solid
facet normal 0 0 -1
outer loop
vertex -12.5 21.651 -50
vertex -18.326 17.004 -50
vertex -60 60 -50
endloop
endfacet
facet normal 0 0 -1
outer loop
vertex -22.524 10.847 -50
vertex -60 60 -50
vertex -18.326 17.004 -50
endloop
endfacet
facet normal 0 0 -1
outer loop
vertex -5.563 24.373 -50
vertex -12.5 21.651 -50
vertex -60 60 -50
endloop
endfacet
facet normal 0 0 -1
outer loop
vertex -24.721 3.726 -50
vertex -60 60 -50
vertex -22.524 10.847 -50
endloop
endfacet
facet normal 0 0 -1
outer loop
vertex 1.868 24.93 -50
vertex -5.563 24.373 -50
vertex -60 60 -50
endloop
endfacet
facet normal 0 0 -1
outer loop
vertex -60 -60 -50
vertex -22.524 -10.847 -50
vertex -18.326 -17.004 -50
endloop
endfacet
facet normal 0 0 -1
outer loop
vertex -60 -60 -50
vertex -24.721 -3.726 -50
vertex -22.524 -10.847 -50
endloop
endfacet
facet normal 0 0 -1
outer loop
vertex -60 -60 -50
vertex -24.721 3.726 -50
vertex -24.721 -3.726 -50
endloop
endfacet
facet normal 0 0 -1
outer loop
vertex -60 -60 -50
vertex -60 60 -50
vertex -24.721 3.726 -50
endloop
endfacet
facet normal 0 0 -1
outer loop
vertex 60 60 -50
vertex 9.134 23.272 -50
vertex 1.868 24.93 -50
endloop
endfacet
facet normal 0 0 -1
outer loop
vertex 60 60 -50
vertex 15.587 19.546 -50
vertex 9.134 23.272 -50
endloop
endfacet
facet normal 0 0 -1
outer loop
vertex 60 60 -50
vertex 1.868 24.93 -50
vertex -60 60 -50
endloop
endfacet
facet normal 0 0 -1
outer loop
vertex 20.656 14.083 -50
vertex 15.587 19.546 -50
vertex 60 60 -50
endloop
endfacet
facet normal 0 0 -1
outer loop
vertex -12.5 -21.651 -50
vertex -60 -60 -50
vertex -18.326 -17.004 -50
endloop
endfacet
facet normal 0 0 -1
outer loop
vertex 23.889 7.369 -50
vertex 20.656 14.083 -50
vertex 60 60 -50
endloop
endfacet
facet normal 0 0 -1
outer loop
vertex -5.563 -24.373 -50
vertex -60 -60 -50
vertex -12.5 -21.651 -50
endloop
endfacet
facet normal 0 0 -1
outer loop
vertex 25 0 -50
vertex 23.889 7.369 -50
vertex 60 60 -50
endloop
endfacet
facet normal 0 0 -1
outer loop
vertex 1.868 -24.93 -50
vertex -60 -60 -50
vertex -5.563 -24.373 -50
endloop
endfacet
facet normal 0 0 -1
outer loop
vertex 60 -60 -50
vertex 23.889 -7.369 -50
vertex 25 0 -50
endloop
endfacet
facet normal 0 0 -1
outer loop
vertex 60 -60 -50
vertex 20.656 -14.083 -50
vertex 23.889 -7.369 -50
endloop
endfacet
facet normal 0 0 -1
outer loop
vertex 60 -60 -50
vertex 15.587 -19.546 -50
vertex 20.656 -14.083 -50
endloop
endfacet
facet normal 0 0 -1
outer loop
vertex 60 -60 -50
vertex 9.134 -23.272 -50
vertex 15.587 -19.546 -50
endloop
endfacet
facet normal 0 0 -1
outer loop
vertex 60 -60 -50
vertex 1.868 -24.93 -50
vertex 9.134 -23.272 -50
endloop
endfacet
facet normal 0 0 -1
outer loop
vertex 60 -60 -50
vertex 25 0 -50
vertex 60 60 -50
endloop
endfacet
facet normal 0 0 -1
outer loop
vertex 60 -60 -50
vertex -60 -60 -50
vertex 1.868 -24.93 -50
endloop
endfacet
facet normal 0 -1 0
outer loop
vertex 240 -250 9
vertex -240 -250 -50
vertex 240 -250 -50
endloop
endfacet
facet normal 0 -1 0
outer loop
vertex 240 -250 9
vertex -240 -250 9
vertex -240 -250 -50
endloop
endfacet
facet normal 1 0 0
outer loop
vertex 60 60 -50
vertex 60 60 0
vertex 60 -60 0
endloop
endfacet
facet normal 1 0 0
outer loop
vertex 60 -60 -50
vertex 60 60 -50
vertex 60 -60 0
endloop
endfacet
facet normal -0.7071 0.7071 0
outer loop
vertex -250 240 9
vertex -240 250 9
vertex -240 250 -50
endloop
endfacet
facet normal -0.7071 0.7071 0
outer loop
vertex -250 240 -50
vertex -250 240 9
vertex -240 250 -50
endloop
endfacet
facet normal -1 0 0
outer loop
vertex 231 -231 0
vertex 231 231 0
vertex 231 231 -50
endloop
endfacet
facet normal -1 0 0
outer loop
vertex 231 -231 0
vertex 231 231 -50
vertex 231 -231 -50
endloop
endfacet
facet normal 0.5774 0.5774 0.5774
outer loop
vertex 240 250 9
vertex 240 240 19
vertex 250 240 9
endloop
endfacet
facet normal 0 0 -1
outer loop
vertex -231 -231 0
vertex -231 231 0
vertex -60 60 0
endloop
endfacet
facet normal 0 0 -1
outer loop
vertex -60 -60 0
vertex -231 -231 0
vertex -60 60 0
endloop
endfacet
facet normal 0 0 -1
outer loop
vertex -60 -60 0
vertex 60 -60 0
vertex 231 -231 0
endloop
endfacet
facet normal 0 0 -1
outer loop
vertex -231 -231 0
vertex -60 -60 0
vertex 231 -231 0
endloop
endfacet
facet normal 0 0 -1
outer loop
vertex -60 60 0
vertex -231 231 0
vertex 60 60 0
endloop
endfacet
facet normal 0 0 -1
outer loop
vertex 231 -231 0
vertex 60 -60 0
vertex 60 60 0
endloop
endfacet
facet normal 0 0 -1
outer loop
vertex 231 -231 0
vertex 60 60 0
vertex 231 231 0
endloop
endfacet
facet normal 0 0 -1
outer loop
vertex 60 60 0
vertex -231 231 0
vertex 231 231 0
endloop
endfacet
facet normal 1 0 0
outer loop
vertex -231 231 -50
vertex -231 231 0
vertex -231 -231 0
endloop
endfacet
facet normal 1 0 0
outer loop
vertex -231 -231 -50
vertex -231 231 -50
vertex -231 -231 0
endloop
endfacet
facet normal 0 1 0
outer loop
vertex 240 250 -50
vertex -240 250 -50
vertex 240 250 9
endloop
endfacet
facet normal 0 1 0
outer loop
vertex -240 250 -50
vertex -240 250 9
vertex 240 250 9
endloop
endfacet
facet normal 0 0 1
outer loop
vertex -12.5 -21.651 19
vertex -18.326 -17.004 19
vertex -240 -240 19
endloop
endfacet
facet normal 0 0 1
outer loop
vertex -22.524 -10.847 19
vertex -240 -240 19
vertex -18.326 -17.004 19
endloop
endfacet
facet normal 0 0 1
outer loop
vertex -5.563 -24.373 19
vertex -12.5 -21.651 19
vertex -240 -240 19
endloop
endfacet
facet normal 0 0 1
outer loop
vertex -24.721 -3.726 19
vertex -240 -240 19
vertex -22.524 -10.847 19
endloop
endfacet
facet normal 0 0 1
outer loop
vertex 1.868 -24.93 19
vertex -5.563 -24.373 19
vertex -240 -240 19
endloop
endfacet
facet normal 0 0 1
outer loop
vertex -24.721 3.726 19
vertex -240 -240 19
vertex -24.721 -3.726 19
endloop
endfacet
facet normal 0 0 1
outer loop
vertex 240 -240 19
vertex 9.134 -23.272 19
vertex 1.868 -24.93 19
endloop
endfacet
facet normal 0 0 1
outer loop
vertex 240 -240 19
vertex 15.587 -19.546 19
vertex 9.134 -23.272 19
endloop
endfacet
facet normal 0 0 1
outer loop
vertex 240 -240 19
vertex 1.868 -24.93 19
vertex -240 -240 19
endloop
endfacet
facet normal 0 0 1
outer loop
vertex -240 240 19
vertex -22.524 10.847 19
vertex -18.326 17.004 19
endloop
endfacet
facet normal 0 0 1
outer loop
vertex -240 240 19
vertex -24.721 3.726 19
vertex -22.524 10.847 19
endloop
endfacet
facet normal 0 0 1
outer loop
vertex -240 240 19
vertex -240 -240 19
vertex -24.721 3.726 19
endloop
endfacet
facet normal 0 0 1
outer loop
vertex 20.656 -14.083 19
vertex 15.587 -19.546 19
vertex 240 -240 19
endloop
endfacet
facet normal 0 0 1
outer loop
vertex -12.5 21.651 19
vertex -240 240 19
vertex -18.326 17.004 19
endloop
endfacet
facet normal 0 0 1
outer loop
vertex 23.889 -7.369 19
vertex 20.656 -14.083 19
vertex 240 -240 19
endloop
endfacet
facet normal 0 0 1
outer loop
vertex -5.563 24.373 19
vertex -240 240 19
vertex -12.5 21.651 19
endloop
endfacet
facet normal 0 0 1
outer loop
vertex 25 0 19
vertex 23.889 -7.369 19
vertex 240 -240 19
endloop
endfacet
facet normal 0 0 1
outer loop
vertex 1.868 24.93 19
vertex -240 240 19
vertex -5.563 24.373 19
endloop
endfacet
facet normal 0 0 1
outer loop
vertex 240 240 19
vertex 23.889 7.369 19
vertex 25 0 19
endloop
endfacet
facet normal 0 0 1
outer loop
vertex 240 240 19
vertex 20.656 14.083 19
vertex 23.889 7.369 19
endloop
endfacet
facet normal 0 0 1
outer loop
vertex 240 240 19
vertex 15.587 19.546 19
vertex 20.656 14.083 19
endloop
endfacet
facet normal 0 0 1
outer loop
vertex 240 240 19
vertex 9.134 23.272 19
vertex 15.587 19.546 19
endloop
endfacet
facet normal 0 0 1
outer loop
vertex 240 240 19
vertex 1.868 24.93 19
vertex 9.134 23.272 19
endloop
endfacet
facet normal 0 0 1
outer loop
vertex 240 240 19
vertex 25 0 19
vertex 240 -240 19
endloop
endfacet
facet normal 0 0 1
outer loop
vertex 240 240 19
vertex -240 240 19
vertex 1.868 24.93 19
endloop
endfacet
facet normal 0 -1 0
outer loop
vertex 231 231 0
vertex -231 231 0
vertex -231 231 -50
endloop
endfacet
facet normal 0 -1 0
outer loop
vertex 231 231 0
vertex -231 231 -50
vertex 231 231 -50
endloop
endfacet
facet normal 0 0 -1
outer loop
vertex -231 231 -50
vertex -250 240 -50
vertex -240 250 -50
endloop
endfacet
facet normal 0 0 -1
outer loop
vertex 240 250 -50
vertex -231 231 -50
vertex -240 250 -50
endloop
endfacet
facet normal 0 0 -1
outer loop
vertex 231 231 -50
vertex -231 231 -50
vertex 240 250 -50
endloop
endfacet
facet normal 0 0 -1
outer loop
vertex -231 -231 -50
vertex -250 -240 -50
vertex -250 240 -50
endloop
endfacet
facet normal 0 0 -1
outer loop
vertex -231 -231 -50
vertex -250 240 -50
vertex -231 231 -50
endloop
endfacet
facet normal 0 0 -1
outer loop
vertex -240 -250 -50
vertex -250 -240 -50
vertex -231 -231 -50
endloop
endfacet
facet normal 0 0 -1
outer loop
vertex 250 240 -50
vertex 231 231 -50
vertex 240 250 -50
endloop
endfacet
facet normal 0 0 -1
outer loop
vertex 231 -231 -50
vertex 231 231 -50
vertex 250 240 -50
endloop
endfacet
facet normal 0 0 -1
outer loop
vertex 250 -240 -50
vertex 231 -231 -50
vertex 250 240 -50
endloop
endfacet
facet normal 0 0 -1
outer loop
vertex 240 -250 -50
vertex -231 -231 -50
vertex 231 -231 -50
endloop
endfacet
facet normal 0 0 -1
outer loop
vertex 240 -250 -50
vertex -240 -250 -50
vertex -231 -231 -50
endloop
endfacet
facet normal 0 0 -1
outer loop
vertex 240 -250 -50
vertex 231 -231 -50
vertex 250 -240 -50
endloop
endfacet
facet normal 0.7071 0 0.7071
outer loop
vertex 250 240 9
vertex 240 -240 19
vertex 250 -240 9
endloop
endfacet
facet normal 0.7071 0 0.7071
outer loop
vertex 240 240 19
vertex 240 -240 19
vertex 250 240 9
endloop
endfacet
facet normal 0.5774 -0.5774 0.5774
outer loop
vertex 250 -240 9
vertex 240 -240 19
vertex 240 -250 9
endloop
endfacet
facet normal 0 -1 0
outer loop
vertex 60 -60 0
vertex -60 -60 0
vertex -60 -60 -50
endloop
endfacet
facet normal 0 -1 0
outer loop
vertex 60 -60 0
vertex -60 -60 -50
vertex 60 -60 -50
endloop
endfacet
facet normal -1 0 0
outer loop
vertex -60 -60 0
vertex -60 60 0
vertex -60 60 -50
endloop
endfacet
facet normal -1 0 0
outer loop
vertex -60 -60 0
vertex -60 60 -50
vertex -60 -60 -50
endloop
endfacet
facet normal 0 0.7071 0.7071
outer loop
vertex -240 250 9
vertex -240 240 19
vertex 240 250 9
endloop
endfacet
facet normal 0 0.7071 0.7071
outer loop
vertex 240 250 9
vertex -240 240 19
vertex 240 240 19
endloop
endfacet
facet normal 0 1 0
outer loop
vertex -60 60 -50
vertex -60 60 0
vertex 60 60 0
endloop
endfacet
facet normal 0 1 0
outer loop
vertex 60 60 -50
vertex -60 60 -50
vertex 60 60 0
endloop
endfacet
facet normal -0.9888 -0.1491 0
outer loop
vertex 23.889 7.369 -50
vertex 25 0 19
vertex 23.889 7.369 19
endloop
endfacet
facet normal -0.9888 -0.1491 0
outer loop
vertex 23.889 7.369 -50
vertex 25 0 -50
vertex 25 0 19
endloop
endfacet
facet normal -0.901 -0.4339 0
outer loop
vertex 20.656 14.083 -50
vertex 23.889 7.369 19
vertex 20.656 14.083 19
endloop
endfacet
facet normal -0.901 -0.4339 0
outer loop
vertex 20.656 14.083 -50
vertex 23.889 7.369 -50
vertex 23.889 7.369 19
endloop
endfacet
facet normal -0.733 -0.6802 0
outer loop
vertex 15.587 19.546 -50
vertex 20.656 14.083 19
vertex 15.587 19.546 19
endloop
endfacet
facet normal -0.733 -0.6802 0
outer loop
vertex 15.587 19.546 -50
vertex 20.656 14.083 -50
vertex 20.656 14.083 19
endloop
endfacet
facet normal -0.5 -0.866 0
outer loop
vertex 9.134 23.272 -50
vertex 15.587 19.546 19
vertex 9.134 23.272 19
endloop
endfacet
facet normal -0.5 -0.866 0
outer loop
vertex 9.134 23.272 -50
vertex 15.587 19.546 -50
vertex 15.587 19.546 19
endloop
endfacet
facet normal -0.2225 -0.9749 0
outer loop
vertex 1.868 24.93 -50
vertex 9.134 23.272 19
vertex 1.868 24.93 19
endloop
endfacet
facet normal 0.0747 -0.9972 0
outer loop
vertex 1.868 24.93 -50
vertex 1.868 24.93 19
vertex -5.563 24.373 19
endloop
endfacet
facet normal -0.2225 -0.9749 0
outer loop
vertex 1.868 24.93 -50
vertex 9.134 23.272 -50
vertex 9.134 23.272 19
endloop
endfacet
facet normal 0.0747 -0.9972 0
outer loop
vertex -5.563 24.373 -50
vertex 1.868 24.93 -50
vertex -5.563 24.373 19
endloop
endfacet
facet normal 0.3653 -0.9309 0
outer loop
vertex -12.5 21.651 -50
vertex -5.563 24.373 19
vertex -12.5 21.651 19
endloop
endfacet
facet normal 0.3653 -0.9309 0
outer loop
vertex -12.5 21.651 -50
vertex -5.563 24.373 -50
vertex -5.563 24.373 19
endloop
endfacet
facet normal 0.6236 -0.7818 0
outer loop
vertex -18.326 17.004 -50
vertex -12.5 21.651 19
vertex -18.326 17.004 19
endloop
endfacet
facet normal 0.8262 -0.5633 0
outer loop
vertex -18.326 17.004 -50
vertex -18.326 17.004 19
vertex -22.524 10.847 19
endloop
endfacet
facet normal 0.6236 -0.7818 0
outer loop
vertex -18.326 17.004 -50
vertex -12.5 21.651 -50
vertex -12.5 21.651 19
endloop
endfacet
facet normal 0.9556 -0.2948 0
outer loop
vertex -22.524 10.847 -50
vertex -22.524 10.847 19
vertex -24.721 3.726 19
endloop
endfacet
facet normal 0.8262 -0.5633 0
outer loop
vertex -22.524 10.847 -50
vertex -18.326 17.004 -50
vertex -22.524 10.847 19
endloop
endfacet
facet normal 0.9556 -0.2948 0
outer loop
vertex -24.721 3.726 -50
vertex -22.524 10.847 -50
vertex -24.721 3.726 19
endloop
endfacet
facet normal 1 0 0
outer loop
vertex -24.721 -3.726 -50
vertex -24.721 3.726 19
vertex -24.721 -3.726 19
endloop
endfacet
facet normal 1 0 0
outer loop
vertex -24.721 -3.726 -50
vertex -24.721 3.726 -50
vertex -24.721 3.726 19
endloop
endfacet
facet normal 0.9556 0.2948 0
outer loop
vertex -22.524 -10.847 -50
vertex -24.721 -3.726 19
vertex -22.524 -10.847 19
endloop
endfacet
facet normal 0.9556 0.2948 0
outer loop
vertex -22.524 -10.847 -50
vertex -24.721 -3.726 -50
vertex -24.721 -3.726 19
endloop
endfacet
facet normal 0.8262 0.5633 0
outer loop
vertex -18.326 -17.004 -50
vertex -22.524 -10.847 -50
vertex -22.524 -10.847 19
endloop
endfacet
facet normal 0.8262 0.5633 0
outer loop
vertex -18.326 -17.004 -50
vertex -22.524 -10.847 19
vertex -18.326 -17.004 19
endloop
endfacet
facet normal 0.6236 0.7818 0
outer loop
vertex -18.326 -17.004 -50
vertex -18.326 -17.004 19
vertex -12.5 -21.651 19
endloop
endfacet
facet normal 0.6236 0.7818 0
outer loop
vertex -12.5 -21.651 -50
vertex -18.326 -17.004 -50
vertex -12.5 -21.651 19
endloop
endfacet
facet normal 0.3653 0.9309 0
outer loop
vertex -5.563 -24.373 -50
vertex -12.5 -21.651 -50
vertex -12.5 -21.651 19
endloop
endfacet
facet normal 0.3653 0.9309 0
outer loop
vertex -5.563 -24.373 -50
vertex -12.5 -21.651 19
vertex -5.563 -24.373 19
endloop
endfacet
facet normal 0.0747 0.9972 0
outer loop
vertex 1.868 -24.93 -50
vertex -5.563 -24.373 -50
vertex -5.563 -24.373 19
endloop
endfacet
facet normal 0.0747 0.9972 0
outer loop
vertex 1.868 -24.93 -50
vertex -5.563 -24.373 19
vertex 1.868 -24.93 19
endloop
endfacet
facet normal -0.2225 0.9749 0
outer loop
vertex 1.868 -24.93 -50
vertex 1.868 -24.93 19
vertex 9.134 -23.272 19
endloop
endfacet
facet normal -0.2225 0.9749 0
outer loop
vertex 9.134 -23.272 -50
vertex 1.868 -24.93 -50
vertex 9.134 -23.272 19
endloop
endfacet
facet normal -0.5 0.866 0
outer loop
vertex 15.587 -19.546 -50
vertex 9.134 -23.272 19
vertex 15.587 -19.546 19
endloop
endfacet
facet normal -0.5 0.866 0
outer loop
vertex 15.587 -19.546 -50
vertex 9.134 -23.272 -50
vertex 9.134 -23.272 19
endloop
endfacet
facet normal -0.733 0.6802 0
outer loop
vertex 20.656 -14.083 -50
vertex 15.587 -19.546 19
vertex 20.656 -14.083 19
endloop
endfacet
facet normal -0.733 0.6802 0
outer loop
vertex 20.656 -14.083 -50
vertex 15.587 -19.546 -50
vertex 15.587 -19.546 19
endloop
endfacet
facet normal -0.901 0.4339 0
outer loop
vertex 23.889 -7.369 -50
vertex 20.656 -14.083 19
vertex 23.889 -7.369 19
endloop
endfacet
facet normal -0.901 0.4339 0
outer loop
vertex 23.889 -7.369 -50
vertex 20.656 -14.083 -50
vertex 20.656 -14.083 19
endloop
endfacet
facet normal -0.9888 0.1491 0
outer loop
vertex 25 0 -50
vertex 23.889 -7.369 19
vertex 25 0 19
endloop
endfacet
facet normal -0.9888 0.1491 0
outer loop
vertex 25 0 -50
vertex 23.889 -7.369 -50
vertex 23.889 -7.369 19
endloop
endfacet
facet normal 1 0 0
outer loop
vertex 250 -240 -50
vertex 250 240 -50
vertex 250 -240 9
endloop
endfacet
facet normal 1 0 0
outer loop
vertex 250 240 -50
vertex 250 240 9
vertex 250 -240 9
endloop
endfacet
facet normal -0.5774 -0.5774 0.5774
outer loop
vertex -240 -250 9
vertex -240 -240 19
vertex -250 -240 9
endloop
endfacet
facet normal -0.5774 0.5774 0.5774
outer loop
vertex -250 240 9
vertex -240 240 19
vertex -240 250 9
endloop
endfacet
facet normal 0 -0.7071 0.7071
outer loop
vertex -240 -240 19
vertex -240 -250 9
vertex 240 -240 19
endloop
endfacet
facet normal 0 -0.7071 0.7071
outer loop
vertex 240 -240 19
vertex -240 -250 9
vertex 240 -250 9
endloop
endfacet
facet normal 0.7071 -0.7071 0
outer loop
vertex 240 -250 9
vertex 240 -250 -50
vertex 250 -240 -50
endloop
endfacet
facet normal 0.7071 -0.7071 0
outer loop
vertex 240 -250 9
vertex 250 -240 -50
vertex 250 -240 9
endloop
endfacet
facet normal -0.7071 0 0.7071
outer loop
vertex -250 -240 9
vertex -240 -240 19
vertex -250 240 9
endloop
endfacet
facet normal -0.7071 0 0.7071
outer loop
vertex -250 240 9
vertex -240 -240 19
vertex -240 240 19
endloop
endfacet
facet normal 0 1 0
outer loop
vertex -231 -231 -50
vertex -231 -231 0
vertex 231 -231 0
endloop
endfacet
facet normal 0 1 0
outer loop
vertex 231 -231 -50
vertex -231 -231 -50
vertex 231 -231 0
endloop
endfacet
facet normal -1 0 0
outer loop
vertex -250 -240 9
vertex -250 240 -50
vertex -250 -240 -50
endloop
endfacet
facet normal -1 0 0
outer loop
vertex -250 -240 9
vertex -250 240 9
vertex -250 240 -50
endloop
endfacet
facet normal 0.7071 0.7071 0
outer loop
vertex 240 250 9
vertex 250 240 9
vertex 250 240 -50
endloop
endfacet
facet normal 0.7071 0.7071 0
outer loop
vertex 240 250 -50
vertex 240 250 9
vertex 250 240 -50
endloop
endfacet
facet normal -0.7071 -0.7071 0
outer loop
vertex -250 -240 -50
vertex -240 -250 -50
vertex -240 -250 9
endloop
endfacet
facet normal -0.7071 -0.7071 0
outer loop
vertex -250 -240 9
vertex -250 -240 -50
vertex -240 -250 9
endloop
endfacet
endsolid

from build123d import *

# Parameters (mm, degrees)
F0_W     = 500
F0_H     = 500
F0_R     = 25
F1_DEPTH = 19
F2_W     = 500
F2_H     = 500
F2_W_2   = 462
F2_H_2   = 462
F2_W_3   = 120
F2_H_3   = 120
F2_R     = 25
F3_DEPTH = 50
F4_SIZE  = 10


with BuildPart() as f1:
    # F0 (on Top) → F1 (new body)
    with BuildSketch(Plane.XY):
        Rectangle(F0_W, F0_H)
        Circle(F0_R, mode=Mode.SUBTRACT)
    extrude(amount=F1_DEPTH)

    # F2 (on face) → F3 (join)
    with BuildSketch(Plane(origin=(0, 0, 0), x_dir=(1, 0, 0), z_dir=(0, 0, -1))):
        Rectangle(F2_W, F2_H)
        Rectangle(F2_W_2, F2_H_2, mode=Mode.SUBTRACT)
        Rectangle(F2_W_3, F2_H_3)
        Circle(F2_R, mode=Mode.SUBTRACT)
    extrude(amount=F3_DEPTH)

    # F4
    f4_edges = [f1.edges().sort_by_distance(p)[0] for p in [
        (0, 250, 19),
        (250, 0, 19),
        (0, -250, 19),
        (-250, 0, 19),
        (-250, 250, -15.5),
        (-250, -250, -15.5),
        (250, 250, -15.5),
        (250, -250, -15.5),
    ]]
    chamfer(f4_edges, length=F4_SIZE)


solid = f1.part
